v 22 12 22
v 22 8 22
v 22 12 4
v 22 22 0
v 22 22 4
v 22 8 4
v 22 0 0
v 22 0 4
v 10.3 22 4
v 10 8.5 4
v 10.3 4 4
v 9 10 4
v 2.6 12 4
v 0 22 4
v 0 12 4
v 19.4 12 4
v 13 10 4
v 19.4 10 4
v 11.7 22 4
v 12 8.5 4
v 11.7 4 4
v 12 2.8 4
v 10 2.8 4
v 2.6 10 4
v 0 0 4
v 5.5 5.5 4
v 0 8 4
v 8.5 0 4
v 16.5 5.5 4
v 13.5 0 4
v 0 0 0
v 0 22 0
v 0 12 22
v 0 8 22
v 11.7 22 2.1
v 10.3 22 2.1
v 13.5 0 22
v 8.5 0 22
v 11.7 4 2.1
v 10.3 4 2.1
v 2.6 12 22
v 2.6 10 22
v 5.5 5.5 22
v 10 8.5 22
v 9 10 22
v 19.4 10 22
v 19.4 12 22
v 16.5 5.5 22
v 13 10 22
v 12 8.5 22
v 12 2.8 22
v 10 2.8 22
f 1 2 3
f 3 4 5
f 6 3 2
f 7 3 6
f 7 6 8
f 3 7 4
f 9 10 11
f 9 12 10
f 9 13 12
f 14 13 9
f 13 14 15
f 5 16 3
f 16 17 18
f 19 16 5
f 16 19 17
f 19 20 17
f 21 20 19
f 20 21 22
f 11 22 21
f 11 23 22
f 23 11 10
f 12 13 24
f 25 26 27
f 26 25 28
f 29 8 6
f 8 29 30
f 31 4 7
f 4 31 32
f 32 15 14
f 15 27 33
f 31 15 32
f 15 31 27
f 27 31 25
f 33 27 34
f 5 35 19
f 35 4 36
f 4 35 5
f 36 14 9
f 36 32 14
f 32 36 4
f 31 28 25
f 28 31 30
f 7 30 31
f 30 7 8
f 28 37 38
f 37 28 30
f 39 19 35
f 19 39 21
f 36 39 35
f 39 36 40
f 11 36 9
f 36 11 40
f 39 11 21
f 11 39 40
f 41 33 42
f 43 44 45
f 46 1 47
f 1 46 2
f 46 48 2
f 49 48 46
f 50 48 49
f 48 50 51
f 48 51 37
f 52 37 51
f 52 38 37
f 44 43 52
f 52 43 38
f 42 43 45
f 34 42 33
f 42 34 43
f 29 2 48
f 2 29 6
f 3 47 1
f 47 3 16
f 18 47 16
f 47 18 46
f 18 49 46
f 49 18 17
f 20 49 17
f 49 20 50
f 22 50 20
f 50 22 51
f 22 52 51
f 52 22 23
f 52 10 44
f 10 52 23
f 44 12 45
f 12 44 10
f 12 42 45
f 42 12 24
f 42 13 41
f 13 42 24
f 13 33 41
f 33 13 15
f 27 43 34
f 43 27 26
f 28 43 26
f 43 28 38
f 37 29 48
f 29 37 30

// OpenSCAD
print_error=0.2;

rail_width=1;

brbrd_bender_socket(print_error=print_error);
//brbrd_bender_plug(print_error=print_error);

module brbrd_bender_socket(print_error=0) {
  translate([0, 0, 3])
    linear_extrude(height=19) import(file="brbrd-bender-socket-43d.dxf");
  
  difference() {
    cube([22, 12+10, 4]);
    
    // паз для рельса
    translate([22/2-rail_width/2-print_error, 4, 2.1]) cube([rail_width+print_error*2, 24, 2]);
  }
}

module brbrd_bender_plug(print_error=0) {
  translate([0, 0, 2])
    linear_extrude(height=19) import(file="brbrd-bender-plug-43d.dxf");
    
  // рельс
  //translate([3.5/2-rail_width/2+print_error, 0, 0]) cube([rail_width-print_error*2, 9, 2]);
  translate([15/2-rail_width/2, 2, 0]) cube([rail_width, 10, 2]);
}
